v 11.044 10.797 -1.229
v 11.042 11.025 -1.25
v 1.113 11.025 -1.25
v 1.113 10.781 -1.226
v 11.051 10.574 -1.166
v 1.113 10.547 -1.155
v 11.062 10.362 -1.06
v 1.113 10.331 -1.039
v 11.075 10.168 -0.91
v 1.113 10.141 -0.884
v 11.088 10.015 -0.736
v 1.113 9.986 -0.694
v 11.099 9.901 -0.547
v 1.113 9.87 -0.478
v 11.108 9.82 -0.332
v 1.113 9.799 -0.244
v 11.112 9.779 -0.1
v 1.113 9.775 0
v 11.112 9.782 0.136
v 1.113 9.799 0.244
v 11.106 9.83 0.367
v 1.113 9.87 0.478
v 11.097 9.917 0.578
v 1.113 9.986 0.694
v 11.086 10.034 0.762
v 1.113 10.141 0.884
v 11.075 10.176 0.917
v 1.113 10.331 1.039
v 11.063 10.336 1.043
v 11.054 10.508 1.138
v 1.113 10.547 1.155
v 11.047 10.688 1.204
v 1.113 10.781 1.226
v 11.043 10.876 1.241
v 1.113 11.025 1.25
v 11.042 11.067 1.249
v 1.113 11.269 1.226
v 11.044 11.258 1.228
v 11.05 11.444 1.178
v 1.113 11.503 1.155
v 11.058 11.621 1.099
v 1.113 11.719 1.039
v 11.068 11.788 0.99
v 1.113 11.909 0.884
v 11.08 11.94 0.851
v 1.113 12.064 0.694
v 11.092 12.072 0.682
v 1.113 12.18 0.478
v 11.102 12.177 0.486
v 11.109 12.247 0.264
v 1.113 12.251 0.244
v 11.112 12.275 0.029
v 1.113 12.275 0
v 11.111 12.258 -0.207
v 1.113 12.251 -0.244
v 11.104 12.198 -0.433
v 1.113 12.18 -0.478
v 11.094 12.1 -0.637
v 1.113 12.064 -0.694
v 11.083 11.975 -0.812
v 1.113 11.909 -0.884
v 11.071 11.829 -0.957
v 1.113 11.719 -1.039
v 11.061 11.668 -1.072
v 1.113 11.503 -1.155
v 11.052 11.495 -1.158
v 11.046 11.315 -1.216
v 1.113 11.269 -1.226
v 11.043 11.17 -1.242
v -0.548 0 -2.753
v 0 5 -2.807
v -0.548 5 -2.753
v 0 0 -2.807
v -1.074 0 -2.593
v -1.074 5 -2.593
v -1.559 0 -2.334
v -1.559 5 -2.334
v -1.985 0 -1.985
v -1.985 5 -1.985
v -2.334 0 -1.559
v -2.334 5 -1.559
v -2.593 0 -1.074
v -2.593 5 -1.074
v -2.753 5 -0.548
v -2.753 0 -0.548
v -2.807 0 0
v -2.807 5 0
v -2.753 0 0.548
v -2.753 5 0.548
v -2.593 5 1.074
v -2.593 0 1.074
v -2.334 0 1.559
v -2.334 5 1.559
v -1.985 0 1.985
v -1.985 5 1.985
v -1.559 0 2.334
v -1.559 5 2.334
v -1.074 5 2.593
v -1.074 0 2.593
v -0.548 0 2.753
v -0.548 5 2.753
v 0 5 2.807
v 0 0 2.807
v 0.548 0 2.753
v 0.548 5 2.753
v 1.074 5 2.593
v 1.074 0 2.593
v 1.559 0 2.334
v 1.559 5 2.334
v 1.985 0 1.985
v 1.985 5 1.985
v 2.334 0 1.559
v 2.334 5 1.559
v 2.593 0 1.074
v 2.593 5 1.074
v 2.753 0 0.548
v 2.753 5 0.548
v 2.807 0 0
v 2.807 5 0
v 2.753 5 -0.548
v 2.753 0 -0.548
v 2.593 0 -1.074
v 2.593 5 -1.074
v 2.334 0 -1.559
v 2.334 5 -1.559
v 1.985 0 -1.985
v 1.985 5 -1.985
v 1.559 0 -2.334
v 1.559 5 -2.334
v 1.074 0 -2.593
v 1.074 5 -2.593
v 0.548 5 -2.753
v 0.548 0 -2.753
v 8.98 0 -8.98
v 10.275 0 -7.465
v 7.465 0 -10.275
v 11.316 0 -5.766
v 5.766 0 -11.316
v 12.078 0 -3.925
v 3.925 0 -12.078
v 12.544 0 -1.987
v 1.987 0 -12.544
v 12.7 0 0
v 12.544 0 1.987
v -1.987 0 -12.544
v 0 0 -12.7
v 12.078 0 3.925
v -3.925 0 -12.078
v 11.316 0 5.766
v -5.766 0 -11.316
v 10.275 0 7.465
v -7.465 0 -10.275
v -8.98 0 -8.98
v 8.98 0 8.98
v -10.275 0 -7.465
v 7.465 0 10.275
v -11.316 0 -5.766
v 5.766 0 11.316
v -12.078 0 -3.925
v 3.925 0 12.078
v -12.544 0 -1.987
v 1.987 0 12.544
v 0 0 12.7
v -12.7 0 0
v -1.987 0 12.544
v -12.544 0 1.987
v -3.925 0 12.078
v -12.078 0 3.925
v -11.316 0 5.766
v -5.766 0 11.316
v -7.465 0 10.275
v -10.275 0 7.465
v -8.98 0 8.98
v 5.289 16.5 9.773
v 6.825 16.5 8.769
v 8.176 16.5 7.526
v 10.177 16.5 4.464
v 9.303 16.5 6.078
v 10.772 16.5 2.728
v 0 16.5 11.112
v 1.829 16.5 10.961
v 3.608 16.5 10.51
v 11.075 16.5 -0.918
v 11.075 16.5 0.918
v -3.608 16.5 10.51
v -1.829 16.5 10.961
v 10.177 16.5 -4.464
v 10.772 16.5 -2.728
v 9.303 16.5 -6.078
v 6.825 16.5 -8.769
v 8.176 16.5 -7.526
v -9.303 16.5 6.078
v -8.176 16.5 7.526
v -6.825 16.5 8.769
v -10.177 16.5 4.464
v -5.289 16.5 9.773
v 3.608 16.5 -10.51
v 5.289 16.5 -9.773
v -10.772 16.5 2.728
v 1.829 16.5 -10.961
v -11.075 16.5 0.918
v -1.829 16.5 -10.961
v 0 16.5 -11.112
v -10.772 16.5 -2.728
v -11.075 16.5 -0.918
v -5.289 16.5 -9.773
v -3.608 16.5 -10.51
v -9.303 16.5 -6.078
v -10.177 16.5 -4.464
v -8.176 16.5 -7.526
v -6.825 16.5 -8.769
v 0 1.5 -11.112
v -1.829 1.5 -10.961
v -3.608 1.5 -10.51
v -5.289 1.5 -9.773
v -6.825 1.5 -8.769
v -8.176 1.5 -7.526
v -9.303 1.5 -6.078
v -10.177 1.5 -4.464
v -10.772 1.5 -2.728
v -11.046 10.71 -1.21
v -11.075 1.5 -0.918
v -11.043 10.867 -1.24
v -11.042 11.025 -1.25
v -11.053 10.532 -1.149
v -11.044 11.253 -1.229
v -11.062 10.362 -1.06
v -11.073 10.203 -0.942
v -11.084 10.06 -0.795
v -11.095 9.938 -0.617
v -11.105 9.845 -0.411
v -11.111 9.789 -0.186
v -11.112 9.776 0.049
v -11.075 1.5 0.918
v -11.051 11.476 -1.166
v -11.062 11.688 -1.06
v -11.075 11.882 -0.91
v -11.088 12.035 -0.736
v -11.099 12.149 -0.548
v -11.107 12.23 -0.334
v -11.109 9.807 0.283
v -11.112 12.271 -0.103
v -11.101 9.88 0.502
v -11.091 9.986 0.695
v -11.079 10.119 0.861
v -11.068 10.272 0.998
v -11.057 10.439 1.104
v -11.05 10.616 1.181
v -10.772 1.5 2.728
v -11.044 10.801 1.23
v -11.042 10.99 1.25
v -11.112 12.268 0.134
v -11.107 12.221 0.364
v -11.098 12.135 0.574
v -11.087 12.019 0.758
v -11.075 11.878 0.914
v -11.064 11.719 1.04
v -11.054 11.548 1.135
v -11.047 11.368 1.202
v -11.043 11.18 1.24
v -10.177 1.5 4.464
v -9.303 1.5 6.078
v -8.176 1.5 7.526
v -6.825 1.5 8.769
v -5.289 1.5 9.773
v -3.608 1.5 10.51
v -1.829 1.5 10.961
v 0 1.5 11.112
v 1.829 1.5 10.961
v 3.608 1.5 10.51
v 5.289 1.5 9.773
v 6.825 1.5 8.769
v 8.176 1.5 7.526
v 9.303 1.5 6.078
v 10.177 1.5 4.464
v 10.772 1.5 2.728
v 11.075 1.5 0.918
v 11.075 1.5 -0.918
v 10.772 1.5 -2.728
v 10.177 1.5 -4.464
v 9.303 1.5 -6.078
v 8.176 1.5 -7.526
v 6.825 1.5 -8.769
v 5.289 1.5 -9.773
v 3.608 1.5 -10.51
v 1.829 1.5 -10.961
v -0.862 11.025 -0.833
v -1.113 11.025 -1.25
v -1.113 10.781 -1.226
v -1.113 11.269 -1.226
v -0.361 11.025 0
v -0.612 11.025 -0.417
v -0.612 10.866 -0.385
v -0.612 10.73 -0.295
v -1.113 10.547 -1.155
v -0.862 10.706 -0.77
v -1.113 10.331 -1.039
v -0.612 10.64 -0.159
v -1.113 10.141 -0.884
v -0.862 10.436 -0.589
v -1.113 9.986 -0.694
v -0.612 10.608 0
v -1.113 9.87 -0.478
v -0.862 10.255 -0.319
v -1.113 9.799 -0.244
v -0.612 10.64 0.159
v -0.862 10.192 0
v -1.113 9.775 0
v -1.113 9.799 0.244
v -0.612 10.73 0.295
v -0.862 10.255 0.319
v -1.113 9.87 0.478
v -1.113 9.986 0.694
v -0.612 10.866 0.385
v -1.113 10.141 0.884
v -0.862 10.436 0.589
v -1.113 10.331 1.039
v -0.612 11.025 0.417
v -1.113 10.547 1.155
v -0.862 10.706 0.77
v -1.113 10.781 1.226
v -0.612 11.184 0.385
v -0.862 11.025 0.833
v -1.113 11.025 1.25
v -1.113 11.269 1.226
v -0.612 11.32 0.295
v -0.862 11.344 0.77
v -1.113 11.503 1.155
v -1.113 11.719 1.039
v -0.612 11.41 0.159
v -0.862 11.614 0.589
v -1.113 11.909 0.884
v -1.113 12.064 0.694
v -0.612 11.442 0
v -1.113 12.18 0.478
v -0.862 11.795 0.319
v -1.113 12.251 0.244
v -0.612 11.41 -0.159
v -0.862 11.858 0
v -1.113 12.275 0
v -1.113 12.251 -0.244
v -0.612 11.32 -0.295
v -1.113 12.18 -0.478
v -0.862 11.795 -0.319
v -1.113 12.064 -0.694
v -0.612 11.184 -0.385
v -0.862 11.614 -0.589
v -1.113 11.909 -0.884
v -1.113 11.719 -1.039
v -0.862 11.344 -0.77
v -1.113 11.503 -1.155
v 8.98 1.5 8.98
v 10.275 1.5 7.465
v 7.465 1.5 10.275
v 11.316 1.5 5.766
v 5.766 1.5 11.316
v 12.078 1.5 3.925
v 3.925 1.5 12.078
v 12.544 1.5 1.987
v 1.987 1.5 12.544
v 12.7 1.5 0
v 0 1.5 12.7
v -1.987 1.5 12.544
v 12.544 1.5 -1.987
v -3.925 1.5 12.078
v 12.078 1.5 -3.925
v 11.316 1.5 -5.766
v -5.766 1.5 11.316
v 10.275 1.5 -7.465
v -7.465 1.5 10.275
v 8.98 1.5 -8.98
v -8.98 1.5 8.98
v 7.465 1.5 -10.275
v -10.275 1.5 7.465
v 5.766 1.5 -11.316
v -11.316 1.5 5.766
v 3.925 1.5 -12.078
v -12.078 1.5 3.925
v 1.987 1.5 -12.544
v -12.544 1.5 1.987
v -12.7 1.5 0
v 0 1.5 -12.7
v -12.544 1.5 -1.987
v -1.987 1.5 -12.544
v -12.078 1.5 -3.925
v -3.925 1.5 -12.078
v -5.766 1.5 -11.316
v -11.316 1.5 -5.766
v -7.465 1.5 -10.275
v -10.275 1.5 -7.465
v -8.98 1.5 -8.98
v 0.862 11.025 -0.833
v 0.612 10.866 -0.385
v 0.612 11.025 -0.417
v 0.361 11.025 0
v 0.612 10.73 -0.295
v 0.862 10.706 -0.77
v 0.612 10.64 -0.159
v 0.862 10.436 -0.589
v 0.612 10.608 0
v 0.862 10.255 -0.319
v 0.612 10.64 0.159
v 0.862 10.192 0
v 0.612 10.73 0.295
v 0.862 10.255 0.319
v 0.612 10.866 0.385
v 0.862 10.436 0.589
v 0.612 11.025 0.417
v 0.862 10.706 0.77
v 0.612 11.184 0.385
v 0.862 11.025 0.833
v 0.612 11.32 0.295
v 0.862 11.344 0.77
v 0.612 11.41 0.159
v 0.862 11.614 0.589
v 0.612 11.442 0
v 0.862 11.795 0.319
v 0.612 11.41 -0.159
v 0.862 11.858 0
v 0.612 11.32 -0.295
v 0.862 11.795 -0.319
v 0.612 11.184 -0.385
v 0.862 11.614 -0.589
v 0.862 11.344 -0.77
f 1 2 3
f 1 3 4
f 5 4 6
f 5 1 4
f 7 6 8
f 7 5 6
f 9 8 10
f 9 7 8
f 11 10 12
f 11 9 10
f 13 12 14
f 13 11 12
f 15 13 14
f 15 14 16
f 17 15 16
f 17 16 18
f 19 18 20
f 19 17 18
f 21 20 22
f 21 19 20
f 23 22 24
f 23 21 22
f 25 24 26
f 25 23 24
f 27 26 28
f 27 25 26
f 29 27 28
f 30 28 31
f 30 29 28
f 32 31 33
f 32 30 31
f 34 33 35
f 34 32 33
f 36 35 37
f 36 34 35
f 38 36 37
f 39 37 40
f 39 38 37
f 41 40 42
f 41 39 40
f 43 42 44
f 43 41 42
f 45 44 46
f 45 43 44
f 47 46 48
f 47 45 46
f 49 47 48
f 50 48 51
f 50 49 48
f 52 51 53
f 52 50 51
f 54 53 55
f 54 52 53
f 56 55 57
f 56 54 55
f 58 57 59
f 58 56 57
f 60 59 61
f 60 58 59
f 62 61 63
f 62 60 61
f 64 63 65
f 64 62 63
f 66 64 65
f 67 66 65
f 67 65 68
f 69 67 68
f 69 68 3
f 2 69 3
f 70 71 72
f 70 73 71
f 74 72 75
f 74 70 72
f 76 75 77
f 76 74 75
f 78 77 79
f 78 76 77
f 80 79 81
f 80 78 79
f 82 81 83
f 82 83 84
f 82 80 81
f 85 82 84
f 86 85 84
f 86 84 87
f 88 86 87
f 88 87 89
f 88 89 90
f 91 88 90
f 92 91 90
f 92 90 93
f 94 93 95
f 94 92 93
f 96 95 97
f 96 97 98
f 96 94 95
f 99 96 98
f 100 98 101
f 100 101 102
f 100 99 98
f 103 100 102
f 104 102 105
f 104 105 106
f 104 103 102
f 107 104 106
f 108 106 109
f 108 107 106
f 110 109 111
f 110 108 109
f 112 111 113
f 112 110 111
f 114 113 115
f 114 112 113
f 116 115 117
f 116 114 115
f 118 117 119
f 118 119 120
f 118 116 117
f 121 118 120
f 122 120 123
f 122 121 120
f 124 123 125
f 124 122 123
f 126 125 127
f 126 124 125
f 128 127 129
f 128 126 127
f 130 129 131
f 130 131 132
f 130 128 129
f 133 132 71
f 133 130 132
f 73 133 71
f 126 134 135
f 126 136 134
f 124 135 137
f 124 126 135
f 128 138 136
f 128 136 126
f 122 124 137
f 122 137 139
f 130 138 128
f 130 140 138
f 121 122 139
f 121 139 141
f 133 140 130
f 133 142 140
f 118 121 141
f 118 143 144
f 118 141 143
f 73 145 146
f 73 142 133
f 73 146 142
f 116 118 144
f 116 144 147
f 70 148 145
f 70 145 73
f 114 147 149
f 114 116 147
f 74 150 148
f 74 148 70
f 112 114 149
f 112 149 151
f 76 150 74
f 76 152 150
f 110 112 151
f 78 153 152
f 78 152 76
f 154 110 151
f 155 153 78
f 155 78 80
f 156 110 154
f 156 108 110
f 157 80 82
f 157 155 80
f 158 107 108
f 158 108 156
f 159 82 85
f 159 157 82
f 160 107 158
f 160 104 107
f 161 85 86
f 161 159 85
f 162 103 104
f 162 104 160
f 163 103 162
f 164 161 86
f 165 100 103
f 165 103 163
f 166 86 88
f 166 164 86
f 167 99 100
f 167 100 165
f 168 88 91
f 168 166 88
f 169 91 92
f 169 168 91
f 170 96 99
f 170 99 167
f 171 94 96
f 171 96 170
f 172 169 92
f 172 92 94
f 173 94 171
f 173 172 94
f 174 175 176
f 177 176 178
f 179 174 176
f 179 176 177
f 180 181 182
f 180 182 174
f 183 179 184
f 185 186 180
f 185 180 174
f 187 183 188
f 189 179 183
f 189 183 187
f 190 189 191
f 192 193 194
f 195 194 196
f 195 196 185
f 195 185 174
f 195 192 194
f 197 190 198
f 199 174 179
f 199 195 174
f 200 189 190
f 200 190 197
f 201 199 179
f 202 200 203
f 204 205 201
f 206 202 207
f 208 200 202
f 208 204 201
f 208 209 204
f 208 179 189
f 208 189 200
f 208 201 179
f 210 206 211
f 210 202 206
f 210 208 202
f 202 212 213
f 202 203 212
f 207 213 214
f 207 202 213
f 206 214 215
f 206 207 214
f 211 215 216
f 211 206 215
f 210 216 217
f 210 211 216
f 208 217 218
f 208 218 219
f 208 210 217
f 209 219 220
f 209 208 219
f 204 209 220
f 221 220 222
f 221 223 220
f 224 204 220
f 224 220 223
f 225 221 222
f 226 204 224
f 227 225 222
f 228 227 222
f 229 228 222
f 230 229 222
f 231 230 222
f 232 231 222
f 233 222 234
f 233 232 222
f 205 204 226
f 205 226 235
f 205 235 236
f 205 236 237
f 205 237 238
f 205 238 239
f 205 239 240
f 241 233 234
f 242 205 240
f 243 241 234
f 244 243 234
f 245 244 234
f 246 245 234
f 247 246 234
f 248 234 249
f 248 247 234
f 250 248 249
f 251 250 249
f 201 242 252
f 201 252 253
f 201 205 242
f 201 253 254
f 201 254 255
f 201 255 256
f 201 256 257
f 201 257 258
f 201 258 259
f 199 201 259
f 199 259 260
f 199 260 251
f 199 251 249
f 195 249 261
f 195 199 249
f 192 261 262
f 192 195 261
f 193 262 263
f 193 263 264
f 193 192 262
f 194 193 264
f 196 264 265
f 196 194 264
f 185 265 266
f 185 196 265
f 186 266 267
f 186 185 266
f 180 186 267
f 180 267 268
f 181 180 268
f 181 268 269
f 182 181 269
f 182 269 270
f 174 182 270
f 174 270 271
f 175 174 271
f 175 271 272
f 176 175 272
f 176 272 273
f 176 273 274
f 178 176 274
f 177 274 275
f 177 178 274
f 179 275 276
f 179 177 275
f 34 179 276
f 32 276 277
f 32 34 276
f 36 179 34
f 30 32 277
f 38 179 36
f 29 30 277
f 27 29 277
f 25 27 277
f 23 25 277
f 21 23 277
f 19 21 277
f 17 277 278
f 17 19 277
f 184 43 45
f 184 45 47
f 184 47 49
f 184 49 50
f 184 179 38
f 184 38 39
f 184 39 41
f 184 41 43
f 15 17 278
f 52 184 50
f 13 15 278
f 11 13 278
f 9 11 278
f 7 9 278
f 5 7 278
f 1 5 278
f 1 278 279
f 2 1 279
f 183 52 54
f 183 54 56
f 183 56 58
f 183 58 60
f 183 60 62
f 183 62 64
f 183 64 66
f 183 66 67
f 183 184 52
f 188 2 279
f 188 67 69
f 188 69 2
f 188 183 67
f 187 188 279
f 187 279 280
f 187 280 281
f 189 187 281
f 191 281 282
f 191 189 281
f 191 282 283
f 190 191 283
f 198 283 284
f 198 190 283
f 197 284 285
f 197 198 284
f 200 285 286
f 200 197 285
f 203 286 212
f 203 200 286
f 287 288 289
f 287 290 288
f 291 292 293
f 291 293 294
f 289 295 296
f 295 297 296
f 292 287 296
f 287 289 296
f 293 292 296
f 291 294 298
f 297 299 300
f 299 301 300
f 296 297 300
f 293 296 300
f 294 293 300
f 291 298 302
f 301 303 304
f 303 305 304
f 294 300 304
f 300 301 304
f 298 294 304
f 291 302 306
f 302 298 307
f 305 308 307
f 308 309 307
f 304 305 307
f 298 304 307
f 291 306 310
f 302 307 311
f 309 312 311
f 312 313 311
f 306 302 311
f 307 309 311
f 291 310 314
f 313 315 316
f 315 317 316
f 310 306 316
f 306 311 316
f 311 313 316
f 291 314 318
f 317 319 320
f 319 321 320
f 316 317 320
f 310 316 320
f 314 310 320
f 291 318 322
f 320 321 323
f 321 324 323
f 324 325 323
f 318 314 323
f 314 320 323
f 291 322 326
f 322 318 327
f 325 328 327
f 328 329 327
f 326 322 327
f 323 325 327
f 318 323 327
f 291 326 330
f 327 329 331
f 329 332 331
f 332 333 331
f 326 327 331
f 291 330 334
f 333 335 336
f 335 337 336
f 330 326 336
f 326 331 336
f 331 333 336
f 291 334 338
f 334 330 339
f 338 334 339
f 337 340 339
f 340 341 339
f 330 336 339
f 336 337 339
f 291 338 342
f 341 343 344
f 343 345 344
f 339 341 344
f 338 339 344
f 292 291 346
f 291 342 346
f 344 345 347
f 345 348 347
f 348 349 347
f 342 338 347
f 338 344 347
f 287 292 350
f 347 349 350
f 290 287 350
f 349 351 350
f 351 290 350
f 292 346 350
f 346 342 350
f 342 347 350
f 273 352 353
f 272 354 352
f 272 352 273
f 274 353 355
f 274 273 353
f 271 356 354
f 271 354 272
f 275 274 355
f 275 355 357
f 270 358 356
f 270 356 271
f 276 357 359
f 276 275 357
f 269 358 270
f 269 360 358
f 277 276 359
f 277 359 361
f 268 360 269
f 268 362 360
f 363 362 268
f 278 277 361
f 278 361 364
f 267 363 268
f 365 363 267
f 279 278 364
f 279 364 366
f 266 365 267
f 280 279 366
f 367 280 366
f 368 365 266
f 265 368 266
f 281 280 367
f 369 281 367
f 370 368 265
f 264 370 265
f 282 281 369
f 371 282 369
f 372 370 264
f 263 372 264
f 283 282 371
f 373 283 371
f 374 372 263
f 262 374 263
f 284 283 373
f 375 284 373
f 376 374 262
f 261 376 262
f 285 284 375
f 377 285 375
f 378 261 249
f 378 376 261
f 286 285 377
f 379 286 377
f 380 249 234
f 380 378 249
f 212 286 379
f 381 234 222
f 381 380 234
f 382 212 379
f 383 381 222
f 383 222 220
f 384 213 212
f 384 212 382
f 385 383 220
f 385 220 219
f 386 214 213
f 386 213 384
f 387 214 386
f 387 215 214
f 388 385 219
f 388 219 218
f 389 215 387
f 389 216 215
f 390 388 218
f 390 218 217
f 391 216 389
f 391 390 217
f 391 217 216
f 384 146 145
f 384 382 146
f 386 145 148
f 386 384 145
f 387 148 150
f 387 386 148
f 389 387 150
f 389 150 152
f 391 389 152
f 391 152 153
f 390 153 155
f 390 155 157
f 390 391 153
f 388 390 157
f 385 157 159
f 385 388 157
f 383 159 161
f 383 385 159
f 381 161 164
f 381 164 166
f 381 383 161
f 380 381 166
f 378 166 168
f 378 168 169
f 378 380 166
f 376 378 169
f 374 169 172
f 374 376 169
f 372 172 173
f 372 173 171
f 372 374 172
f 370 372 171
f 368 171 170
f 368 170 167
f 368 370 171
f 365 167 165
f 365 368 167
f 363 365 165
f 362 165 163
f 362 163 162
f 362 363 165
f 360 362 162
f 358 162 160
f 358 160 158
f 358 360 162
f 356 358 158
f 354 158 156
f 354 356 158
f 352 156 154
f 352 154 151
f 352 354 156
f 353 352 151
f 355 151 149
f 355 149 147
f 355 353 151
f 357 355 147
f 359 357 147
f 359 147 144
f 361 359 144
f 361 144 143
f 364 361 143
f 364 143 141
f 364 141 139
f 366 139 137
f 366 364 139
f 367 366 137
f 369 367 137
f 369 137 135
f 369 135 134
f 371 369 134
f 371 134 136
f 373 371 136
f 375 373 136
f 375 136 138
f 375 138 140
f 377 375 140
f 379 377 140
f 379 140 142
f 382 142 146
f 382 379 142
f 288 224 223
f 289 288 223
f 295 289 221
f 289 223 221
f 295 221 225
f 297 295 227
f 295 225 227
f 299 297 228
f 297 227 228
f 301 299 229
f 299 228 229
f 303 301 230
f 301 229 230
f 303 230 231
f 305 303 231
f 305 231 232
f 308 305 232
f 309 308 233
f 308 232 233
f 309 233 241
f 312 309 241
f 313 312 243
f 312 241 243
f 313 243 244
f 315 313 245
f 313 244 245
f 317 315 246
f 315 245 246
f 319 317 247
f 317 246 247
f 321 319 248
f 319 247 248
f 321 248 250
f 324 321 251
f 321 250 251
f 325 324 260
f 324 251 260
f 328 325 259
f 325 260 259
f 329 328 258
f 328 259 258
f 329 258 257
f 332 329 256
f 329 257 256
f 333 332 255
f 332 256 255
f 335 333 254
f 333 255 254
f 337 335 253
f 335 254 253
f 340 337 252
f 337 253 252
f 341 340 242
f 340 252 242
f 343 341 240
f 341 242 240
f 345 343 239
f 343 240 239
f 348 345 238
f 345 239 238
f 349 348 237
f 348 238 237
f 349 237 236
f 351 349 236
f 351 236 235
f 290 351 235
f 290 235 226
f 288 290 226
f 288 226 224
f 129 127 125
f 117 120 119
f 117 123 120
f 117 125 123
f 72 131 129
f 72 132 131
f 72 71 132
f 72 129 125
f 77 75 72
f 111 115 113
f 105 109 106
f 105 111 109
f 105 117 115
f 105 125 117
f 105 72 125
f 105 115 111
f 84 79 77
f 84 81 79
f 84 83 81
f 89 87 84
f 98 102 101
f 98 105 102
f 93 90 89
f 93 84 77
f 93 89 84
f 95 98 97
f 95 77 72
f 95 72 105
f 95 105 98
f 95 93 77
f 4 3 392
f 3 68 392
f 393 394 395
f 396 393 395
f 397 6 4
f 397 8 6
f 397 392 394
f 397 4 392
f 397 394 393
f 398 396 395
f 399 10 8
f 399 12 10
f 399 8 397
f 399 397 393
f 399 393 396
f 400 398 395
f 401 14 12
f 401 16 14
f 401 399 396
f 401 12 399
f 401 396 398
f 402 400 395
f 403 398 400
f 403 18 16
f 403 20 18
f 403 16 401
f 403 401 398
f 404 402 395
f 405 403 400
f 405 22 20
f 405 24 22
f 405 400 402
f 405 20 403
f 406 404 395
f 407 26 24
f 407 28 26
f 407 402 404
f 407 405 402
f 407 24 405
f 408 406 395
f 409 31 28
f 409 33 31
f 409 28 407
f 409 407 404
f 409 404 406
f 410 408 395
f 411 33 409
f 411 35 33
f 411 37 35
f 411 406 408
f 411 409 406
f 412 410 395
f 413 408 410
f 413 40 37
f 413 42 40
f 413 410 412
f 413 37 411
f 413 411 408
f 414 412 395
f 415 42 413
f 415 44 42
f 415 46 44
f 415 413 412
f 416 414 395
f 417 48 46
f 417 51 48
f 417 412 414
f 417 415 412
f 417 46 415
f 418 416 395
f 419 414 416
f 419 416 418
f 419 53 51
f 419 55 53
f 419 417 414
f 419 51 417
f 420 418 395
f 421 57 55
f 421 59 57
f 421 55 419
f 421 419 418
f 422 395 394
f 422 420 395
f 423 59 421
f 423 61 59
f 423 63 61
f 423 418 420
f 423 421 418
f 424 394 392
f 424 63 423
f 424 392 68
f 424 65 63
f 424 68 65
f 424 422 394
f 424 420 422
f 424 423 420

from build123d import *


with BuildPart() as part:
    # Sketch1 → Revolve1 (revolve)
    with BuildSketch(Plane(origin=(0, 0, 0), x_dir=(0, 0, -1), z_dir=(1, 0, 0)), mode=Mode.PRIVATE) as revolve1_sk:
        Polygon((-12.7, 0), (-12.7, 1.5), (-11.1125, 1.5), (-11.1125, 16.5), (0, 16.5), (0, 5), (-2.8067, 5), (-2.8067, 0), align=None)
    revolve(revolve1_sk.sketch.rotate(Axis((0, -1000, 0), (0, 1, 0)), 180), axis=Axis((0, -1000, 0), (0, 1, 0)))

    # Sketch4 → M3x0.5 Tapped Hole1 (revolve, cut)
    with BuildSketch(Plane(origin=(11.1125, 11.025, 0), x_dir=(0, 0, -1), z_dir=(0, 1, 0))):
        Polygon((0, 0), (0, 10.751075774), (1.25, 10), (1.25, 0), align=None)
    m3x0_5_tapped_hole1 = revolve(axis=Axis((17.4625, 11.025, 0), (-1, 0, 0)), mode=Mode.SUBTRACT)

    # Mirror1: M3x0.5 Tapped Hole1 across plane
    add(m3x0_5_tapped_hole1.mirror(Plane(origin=(0, 0, 0), x_dir=(0, 0, 1), z_dir=(1, 0, 0))), mode=Mode.SUBTRACT)


solid = part.part
